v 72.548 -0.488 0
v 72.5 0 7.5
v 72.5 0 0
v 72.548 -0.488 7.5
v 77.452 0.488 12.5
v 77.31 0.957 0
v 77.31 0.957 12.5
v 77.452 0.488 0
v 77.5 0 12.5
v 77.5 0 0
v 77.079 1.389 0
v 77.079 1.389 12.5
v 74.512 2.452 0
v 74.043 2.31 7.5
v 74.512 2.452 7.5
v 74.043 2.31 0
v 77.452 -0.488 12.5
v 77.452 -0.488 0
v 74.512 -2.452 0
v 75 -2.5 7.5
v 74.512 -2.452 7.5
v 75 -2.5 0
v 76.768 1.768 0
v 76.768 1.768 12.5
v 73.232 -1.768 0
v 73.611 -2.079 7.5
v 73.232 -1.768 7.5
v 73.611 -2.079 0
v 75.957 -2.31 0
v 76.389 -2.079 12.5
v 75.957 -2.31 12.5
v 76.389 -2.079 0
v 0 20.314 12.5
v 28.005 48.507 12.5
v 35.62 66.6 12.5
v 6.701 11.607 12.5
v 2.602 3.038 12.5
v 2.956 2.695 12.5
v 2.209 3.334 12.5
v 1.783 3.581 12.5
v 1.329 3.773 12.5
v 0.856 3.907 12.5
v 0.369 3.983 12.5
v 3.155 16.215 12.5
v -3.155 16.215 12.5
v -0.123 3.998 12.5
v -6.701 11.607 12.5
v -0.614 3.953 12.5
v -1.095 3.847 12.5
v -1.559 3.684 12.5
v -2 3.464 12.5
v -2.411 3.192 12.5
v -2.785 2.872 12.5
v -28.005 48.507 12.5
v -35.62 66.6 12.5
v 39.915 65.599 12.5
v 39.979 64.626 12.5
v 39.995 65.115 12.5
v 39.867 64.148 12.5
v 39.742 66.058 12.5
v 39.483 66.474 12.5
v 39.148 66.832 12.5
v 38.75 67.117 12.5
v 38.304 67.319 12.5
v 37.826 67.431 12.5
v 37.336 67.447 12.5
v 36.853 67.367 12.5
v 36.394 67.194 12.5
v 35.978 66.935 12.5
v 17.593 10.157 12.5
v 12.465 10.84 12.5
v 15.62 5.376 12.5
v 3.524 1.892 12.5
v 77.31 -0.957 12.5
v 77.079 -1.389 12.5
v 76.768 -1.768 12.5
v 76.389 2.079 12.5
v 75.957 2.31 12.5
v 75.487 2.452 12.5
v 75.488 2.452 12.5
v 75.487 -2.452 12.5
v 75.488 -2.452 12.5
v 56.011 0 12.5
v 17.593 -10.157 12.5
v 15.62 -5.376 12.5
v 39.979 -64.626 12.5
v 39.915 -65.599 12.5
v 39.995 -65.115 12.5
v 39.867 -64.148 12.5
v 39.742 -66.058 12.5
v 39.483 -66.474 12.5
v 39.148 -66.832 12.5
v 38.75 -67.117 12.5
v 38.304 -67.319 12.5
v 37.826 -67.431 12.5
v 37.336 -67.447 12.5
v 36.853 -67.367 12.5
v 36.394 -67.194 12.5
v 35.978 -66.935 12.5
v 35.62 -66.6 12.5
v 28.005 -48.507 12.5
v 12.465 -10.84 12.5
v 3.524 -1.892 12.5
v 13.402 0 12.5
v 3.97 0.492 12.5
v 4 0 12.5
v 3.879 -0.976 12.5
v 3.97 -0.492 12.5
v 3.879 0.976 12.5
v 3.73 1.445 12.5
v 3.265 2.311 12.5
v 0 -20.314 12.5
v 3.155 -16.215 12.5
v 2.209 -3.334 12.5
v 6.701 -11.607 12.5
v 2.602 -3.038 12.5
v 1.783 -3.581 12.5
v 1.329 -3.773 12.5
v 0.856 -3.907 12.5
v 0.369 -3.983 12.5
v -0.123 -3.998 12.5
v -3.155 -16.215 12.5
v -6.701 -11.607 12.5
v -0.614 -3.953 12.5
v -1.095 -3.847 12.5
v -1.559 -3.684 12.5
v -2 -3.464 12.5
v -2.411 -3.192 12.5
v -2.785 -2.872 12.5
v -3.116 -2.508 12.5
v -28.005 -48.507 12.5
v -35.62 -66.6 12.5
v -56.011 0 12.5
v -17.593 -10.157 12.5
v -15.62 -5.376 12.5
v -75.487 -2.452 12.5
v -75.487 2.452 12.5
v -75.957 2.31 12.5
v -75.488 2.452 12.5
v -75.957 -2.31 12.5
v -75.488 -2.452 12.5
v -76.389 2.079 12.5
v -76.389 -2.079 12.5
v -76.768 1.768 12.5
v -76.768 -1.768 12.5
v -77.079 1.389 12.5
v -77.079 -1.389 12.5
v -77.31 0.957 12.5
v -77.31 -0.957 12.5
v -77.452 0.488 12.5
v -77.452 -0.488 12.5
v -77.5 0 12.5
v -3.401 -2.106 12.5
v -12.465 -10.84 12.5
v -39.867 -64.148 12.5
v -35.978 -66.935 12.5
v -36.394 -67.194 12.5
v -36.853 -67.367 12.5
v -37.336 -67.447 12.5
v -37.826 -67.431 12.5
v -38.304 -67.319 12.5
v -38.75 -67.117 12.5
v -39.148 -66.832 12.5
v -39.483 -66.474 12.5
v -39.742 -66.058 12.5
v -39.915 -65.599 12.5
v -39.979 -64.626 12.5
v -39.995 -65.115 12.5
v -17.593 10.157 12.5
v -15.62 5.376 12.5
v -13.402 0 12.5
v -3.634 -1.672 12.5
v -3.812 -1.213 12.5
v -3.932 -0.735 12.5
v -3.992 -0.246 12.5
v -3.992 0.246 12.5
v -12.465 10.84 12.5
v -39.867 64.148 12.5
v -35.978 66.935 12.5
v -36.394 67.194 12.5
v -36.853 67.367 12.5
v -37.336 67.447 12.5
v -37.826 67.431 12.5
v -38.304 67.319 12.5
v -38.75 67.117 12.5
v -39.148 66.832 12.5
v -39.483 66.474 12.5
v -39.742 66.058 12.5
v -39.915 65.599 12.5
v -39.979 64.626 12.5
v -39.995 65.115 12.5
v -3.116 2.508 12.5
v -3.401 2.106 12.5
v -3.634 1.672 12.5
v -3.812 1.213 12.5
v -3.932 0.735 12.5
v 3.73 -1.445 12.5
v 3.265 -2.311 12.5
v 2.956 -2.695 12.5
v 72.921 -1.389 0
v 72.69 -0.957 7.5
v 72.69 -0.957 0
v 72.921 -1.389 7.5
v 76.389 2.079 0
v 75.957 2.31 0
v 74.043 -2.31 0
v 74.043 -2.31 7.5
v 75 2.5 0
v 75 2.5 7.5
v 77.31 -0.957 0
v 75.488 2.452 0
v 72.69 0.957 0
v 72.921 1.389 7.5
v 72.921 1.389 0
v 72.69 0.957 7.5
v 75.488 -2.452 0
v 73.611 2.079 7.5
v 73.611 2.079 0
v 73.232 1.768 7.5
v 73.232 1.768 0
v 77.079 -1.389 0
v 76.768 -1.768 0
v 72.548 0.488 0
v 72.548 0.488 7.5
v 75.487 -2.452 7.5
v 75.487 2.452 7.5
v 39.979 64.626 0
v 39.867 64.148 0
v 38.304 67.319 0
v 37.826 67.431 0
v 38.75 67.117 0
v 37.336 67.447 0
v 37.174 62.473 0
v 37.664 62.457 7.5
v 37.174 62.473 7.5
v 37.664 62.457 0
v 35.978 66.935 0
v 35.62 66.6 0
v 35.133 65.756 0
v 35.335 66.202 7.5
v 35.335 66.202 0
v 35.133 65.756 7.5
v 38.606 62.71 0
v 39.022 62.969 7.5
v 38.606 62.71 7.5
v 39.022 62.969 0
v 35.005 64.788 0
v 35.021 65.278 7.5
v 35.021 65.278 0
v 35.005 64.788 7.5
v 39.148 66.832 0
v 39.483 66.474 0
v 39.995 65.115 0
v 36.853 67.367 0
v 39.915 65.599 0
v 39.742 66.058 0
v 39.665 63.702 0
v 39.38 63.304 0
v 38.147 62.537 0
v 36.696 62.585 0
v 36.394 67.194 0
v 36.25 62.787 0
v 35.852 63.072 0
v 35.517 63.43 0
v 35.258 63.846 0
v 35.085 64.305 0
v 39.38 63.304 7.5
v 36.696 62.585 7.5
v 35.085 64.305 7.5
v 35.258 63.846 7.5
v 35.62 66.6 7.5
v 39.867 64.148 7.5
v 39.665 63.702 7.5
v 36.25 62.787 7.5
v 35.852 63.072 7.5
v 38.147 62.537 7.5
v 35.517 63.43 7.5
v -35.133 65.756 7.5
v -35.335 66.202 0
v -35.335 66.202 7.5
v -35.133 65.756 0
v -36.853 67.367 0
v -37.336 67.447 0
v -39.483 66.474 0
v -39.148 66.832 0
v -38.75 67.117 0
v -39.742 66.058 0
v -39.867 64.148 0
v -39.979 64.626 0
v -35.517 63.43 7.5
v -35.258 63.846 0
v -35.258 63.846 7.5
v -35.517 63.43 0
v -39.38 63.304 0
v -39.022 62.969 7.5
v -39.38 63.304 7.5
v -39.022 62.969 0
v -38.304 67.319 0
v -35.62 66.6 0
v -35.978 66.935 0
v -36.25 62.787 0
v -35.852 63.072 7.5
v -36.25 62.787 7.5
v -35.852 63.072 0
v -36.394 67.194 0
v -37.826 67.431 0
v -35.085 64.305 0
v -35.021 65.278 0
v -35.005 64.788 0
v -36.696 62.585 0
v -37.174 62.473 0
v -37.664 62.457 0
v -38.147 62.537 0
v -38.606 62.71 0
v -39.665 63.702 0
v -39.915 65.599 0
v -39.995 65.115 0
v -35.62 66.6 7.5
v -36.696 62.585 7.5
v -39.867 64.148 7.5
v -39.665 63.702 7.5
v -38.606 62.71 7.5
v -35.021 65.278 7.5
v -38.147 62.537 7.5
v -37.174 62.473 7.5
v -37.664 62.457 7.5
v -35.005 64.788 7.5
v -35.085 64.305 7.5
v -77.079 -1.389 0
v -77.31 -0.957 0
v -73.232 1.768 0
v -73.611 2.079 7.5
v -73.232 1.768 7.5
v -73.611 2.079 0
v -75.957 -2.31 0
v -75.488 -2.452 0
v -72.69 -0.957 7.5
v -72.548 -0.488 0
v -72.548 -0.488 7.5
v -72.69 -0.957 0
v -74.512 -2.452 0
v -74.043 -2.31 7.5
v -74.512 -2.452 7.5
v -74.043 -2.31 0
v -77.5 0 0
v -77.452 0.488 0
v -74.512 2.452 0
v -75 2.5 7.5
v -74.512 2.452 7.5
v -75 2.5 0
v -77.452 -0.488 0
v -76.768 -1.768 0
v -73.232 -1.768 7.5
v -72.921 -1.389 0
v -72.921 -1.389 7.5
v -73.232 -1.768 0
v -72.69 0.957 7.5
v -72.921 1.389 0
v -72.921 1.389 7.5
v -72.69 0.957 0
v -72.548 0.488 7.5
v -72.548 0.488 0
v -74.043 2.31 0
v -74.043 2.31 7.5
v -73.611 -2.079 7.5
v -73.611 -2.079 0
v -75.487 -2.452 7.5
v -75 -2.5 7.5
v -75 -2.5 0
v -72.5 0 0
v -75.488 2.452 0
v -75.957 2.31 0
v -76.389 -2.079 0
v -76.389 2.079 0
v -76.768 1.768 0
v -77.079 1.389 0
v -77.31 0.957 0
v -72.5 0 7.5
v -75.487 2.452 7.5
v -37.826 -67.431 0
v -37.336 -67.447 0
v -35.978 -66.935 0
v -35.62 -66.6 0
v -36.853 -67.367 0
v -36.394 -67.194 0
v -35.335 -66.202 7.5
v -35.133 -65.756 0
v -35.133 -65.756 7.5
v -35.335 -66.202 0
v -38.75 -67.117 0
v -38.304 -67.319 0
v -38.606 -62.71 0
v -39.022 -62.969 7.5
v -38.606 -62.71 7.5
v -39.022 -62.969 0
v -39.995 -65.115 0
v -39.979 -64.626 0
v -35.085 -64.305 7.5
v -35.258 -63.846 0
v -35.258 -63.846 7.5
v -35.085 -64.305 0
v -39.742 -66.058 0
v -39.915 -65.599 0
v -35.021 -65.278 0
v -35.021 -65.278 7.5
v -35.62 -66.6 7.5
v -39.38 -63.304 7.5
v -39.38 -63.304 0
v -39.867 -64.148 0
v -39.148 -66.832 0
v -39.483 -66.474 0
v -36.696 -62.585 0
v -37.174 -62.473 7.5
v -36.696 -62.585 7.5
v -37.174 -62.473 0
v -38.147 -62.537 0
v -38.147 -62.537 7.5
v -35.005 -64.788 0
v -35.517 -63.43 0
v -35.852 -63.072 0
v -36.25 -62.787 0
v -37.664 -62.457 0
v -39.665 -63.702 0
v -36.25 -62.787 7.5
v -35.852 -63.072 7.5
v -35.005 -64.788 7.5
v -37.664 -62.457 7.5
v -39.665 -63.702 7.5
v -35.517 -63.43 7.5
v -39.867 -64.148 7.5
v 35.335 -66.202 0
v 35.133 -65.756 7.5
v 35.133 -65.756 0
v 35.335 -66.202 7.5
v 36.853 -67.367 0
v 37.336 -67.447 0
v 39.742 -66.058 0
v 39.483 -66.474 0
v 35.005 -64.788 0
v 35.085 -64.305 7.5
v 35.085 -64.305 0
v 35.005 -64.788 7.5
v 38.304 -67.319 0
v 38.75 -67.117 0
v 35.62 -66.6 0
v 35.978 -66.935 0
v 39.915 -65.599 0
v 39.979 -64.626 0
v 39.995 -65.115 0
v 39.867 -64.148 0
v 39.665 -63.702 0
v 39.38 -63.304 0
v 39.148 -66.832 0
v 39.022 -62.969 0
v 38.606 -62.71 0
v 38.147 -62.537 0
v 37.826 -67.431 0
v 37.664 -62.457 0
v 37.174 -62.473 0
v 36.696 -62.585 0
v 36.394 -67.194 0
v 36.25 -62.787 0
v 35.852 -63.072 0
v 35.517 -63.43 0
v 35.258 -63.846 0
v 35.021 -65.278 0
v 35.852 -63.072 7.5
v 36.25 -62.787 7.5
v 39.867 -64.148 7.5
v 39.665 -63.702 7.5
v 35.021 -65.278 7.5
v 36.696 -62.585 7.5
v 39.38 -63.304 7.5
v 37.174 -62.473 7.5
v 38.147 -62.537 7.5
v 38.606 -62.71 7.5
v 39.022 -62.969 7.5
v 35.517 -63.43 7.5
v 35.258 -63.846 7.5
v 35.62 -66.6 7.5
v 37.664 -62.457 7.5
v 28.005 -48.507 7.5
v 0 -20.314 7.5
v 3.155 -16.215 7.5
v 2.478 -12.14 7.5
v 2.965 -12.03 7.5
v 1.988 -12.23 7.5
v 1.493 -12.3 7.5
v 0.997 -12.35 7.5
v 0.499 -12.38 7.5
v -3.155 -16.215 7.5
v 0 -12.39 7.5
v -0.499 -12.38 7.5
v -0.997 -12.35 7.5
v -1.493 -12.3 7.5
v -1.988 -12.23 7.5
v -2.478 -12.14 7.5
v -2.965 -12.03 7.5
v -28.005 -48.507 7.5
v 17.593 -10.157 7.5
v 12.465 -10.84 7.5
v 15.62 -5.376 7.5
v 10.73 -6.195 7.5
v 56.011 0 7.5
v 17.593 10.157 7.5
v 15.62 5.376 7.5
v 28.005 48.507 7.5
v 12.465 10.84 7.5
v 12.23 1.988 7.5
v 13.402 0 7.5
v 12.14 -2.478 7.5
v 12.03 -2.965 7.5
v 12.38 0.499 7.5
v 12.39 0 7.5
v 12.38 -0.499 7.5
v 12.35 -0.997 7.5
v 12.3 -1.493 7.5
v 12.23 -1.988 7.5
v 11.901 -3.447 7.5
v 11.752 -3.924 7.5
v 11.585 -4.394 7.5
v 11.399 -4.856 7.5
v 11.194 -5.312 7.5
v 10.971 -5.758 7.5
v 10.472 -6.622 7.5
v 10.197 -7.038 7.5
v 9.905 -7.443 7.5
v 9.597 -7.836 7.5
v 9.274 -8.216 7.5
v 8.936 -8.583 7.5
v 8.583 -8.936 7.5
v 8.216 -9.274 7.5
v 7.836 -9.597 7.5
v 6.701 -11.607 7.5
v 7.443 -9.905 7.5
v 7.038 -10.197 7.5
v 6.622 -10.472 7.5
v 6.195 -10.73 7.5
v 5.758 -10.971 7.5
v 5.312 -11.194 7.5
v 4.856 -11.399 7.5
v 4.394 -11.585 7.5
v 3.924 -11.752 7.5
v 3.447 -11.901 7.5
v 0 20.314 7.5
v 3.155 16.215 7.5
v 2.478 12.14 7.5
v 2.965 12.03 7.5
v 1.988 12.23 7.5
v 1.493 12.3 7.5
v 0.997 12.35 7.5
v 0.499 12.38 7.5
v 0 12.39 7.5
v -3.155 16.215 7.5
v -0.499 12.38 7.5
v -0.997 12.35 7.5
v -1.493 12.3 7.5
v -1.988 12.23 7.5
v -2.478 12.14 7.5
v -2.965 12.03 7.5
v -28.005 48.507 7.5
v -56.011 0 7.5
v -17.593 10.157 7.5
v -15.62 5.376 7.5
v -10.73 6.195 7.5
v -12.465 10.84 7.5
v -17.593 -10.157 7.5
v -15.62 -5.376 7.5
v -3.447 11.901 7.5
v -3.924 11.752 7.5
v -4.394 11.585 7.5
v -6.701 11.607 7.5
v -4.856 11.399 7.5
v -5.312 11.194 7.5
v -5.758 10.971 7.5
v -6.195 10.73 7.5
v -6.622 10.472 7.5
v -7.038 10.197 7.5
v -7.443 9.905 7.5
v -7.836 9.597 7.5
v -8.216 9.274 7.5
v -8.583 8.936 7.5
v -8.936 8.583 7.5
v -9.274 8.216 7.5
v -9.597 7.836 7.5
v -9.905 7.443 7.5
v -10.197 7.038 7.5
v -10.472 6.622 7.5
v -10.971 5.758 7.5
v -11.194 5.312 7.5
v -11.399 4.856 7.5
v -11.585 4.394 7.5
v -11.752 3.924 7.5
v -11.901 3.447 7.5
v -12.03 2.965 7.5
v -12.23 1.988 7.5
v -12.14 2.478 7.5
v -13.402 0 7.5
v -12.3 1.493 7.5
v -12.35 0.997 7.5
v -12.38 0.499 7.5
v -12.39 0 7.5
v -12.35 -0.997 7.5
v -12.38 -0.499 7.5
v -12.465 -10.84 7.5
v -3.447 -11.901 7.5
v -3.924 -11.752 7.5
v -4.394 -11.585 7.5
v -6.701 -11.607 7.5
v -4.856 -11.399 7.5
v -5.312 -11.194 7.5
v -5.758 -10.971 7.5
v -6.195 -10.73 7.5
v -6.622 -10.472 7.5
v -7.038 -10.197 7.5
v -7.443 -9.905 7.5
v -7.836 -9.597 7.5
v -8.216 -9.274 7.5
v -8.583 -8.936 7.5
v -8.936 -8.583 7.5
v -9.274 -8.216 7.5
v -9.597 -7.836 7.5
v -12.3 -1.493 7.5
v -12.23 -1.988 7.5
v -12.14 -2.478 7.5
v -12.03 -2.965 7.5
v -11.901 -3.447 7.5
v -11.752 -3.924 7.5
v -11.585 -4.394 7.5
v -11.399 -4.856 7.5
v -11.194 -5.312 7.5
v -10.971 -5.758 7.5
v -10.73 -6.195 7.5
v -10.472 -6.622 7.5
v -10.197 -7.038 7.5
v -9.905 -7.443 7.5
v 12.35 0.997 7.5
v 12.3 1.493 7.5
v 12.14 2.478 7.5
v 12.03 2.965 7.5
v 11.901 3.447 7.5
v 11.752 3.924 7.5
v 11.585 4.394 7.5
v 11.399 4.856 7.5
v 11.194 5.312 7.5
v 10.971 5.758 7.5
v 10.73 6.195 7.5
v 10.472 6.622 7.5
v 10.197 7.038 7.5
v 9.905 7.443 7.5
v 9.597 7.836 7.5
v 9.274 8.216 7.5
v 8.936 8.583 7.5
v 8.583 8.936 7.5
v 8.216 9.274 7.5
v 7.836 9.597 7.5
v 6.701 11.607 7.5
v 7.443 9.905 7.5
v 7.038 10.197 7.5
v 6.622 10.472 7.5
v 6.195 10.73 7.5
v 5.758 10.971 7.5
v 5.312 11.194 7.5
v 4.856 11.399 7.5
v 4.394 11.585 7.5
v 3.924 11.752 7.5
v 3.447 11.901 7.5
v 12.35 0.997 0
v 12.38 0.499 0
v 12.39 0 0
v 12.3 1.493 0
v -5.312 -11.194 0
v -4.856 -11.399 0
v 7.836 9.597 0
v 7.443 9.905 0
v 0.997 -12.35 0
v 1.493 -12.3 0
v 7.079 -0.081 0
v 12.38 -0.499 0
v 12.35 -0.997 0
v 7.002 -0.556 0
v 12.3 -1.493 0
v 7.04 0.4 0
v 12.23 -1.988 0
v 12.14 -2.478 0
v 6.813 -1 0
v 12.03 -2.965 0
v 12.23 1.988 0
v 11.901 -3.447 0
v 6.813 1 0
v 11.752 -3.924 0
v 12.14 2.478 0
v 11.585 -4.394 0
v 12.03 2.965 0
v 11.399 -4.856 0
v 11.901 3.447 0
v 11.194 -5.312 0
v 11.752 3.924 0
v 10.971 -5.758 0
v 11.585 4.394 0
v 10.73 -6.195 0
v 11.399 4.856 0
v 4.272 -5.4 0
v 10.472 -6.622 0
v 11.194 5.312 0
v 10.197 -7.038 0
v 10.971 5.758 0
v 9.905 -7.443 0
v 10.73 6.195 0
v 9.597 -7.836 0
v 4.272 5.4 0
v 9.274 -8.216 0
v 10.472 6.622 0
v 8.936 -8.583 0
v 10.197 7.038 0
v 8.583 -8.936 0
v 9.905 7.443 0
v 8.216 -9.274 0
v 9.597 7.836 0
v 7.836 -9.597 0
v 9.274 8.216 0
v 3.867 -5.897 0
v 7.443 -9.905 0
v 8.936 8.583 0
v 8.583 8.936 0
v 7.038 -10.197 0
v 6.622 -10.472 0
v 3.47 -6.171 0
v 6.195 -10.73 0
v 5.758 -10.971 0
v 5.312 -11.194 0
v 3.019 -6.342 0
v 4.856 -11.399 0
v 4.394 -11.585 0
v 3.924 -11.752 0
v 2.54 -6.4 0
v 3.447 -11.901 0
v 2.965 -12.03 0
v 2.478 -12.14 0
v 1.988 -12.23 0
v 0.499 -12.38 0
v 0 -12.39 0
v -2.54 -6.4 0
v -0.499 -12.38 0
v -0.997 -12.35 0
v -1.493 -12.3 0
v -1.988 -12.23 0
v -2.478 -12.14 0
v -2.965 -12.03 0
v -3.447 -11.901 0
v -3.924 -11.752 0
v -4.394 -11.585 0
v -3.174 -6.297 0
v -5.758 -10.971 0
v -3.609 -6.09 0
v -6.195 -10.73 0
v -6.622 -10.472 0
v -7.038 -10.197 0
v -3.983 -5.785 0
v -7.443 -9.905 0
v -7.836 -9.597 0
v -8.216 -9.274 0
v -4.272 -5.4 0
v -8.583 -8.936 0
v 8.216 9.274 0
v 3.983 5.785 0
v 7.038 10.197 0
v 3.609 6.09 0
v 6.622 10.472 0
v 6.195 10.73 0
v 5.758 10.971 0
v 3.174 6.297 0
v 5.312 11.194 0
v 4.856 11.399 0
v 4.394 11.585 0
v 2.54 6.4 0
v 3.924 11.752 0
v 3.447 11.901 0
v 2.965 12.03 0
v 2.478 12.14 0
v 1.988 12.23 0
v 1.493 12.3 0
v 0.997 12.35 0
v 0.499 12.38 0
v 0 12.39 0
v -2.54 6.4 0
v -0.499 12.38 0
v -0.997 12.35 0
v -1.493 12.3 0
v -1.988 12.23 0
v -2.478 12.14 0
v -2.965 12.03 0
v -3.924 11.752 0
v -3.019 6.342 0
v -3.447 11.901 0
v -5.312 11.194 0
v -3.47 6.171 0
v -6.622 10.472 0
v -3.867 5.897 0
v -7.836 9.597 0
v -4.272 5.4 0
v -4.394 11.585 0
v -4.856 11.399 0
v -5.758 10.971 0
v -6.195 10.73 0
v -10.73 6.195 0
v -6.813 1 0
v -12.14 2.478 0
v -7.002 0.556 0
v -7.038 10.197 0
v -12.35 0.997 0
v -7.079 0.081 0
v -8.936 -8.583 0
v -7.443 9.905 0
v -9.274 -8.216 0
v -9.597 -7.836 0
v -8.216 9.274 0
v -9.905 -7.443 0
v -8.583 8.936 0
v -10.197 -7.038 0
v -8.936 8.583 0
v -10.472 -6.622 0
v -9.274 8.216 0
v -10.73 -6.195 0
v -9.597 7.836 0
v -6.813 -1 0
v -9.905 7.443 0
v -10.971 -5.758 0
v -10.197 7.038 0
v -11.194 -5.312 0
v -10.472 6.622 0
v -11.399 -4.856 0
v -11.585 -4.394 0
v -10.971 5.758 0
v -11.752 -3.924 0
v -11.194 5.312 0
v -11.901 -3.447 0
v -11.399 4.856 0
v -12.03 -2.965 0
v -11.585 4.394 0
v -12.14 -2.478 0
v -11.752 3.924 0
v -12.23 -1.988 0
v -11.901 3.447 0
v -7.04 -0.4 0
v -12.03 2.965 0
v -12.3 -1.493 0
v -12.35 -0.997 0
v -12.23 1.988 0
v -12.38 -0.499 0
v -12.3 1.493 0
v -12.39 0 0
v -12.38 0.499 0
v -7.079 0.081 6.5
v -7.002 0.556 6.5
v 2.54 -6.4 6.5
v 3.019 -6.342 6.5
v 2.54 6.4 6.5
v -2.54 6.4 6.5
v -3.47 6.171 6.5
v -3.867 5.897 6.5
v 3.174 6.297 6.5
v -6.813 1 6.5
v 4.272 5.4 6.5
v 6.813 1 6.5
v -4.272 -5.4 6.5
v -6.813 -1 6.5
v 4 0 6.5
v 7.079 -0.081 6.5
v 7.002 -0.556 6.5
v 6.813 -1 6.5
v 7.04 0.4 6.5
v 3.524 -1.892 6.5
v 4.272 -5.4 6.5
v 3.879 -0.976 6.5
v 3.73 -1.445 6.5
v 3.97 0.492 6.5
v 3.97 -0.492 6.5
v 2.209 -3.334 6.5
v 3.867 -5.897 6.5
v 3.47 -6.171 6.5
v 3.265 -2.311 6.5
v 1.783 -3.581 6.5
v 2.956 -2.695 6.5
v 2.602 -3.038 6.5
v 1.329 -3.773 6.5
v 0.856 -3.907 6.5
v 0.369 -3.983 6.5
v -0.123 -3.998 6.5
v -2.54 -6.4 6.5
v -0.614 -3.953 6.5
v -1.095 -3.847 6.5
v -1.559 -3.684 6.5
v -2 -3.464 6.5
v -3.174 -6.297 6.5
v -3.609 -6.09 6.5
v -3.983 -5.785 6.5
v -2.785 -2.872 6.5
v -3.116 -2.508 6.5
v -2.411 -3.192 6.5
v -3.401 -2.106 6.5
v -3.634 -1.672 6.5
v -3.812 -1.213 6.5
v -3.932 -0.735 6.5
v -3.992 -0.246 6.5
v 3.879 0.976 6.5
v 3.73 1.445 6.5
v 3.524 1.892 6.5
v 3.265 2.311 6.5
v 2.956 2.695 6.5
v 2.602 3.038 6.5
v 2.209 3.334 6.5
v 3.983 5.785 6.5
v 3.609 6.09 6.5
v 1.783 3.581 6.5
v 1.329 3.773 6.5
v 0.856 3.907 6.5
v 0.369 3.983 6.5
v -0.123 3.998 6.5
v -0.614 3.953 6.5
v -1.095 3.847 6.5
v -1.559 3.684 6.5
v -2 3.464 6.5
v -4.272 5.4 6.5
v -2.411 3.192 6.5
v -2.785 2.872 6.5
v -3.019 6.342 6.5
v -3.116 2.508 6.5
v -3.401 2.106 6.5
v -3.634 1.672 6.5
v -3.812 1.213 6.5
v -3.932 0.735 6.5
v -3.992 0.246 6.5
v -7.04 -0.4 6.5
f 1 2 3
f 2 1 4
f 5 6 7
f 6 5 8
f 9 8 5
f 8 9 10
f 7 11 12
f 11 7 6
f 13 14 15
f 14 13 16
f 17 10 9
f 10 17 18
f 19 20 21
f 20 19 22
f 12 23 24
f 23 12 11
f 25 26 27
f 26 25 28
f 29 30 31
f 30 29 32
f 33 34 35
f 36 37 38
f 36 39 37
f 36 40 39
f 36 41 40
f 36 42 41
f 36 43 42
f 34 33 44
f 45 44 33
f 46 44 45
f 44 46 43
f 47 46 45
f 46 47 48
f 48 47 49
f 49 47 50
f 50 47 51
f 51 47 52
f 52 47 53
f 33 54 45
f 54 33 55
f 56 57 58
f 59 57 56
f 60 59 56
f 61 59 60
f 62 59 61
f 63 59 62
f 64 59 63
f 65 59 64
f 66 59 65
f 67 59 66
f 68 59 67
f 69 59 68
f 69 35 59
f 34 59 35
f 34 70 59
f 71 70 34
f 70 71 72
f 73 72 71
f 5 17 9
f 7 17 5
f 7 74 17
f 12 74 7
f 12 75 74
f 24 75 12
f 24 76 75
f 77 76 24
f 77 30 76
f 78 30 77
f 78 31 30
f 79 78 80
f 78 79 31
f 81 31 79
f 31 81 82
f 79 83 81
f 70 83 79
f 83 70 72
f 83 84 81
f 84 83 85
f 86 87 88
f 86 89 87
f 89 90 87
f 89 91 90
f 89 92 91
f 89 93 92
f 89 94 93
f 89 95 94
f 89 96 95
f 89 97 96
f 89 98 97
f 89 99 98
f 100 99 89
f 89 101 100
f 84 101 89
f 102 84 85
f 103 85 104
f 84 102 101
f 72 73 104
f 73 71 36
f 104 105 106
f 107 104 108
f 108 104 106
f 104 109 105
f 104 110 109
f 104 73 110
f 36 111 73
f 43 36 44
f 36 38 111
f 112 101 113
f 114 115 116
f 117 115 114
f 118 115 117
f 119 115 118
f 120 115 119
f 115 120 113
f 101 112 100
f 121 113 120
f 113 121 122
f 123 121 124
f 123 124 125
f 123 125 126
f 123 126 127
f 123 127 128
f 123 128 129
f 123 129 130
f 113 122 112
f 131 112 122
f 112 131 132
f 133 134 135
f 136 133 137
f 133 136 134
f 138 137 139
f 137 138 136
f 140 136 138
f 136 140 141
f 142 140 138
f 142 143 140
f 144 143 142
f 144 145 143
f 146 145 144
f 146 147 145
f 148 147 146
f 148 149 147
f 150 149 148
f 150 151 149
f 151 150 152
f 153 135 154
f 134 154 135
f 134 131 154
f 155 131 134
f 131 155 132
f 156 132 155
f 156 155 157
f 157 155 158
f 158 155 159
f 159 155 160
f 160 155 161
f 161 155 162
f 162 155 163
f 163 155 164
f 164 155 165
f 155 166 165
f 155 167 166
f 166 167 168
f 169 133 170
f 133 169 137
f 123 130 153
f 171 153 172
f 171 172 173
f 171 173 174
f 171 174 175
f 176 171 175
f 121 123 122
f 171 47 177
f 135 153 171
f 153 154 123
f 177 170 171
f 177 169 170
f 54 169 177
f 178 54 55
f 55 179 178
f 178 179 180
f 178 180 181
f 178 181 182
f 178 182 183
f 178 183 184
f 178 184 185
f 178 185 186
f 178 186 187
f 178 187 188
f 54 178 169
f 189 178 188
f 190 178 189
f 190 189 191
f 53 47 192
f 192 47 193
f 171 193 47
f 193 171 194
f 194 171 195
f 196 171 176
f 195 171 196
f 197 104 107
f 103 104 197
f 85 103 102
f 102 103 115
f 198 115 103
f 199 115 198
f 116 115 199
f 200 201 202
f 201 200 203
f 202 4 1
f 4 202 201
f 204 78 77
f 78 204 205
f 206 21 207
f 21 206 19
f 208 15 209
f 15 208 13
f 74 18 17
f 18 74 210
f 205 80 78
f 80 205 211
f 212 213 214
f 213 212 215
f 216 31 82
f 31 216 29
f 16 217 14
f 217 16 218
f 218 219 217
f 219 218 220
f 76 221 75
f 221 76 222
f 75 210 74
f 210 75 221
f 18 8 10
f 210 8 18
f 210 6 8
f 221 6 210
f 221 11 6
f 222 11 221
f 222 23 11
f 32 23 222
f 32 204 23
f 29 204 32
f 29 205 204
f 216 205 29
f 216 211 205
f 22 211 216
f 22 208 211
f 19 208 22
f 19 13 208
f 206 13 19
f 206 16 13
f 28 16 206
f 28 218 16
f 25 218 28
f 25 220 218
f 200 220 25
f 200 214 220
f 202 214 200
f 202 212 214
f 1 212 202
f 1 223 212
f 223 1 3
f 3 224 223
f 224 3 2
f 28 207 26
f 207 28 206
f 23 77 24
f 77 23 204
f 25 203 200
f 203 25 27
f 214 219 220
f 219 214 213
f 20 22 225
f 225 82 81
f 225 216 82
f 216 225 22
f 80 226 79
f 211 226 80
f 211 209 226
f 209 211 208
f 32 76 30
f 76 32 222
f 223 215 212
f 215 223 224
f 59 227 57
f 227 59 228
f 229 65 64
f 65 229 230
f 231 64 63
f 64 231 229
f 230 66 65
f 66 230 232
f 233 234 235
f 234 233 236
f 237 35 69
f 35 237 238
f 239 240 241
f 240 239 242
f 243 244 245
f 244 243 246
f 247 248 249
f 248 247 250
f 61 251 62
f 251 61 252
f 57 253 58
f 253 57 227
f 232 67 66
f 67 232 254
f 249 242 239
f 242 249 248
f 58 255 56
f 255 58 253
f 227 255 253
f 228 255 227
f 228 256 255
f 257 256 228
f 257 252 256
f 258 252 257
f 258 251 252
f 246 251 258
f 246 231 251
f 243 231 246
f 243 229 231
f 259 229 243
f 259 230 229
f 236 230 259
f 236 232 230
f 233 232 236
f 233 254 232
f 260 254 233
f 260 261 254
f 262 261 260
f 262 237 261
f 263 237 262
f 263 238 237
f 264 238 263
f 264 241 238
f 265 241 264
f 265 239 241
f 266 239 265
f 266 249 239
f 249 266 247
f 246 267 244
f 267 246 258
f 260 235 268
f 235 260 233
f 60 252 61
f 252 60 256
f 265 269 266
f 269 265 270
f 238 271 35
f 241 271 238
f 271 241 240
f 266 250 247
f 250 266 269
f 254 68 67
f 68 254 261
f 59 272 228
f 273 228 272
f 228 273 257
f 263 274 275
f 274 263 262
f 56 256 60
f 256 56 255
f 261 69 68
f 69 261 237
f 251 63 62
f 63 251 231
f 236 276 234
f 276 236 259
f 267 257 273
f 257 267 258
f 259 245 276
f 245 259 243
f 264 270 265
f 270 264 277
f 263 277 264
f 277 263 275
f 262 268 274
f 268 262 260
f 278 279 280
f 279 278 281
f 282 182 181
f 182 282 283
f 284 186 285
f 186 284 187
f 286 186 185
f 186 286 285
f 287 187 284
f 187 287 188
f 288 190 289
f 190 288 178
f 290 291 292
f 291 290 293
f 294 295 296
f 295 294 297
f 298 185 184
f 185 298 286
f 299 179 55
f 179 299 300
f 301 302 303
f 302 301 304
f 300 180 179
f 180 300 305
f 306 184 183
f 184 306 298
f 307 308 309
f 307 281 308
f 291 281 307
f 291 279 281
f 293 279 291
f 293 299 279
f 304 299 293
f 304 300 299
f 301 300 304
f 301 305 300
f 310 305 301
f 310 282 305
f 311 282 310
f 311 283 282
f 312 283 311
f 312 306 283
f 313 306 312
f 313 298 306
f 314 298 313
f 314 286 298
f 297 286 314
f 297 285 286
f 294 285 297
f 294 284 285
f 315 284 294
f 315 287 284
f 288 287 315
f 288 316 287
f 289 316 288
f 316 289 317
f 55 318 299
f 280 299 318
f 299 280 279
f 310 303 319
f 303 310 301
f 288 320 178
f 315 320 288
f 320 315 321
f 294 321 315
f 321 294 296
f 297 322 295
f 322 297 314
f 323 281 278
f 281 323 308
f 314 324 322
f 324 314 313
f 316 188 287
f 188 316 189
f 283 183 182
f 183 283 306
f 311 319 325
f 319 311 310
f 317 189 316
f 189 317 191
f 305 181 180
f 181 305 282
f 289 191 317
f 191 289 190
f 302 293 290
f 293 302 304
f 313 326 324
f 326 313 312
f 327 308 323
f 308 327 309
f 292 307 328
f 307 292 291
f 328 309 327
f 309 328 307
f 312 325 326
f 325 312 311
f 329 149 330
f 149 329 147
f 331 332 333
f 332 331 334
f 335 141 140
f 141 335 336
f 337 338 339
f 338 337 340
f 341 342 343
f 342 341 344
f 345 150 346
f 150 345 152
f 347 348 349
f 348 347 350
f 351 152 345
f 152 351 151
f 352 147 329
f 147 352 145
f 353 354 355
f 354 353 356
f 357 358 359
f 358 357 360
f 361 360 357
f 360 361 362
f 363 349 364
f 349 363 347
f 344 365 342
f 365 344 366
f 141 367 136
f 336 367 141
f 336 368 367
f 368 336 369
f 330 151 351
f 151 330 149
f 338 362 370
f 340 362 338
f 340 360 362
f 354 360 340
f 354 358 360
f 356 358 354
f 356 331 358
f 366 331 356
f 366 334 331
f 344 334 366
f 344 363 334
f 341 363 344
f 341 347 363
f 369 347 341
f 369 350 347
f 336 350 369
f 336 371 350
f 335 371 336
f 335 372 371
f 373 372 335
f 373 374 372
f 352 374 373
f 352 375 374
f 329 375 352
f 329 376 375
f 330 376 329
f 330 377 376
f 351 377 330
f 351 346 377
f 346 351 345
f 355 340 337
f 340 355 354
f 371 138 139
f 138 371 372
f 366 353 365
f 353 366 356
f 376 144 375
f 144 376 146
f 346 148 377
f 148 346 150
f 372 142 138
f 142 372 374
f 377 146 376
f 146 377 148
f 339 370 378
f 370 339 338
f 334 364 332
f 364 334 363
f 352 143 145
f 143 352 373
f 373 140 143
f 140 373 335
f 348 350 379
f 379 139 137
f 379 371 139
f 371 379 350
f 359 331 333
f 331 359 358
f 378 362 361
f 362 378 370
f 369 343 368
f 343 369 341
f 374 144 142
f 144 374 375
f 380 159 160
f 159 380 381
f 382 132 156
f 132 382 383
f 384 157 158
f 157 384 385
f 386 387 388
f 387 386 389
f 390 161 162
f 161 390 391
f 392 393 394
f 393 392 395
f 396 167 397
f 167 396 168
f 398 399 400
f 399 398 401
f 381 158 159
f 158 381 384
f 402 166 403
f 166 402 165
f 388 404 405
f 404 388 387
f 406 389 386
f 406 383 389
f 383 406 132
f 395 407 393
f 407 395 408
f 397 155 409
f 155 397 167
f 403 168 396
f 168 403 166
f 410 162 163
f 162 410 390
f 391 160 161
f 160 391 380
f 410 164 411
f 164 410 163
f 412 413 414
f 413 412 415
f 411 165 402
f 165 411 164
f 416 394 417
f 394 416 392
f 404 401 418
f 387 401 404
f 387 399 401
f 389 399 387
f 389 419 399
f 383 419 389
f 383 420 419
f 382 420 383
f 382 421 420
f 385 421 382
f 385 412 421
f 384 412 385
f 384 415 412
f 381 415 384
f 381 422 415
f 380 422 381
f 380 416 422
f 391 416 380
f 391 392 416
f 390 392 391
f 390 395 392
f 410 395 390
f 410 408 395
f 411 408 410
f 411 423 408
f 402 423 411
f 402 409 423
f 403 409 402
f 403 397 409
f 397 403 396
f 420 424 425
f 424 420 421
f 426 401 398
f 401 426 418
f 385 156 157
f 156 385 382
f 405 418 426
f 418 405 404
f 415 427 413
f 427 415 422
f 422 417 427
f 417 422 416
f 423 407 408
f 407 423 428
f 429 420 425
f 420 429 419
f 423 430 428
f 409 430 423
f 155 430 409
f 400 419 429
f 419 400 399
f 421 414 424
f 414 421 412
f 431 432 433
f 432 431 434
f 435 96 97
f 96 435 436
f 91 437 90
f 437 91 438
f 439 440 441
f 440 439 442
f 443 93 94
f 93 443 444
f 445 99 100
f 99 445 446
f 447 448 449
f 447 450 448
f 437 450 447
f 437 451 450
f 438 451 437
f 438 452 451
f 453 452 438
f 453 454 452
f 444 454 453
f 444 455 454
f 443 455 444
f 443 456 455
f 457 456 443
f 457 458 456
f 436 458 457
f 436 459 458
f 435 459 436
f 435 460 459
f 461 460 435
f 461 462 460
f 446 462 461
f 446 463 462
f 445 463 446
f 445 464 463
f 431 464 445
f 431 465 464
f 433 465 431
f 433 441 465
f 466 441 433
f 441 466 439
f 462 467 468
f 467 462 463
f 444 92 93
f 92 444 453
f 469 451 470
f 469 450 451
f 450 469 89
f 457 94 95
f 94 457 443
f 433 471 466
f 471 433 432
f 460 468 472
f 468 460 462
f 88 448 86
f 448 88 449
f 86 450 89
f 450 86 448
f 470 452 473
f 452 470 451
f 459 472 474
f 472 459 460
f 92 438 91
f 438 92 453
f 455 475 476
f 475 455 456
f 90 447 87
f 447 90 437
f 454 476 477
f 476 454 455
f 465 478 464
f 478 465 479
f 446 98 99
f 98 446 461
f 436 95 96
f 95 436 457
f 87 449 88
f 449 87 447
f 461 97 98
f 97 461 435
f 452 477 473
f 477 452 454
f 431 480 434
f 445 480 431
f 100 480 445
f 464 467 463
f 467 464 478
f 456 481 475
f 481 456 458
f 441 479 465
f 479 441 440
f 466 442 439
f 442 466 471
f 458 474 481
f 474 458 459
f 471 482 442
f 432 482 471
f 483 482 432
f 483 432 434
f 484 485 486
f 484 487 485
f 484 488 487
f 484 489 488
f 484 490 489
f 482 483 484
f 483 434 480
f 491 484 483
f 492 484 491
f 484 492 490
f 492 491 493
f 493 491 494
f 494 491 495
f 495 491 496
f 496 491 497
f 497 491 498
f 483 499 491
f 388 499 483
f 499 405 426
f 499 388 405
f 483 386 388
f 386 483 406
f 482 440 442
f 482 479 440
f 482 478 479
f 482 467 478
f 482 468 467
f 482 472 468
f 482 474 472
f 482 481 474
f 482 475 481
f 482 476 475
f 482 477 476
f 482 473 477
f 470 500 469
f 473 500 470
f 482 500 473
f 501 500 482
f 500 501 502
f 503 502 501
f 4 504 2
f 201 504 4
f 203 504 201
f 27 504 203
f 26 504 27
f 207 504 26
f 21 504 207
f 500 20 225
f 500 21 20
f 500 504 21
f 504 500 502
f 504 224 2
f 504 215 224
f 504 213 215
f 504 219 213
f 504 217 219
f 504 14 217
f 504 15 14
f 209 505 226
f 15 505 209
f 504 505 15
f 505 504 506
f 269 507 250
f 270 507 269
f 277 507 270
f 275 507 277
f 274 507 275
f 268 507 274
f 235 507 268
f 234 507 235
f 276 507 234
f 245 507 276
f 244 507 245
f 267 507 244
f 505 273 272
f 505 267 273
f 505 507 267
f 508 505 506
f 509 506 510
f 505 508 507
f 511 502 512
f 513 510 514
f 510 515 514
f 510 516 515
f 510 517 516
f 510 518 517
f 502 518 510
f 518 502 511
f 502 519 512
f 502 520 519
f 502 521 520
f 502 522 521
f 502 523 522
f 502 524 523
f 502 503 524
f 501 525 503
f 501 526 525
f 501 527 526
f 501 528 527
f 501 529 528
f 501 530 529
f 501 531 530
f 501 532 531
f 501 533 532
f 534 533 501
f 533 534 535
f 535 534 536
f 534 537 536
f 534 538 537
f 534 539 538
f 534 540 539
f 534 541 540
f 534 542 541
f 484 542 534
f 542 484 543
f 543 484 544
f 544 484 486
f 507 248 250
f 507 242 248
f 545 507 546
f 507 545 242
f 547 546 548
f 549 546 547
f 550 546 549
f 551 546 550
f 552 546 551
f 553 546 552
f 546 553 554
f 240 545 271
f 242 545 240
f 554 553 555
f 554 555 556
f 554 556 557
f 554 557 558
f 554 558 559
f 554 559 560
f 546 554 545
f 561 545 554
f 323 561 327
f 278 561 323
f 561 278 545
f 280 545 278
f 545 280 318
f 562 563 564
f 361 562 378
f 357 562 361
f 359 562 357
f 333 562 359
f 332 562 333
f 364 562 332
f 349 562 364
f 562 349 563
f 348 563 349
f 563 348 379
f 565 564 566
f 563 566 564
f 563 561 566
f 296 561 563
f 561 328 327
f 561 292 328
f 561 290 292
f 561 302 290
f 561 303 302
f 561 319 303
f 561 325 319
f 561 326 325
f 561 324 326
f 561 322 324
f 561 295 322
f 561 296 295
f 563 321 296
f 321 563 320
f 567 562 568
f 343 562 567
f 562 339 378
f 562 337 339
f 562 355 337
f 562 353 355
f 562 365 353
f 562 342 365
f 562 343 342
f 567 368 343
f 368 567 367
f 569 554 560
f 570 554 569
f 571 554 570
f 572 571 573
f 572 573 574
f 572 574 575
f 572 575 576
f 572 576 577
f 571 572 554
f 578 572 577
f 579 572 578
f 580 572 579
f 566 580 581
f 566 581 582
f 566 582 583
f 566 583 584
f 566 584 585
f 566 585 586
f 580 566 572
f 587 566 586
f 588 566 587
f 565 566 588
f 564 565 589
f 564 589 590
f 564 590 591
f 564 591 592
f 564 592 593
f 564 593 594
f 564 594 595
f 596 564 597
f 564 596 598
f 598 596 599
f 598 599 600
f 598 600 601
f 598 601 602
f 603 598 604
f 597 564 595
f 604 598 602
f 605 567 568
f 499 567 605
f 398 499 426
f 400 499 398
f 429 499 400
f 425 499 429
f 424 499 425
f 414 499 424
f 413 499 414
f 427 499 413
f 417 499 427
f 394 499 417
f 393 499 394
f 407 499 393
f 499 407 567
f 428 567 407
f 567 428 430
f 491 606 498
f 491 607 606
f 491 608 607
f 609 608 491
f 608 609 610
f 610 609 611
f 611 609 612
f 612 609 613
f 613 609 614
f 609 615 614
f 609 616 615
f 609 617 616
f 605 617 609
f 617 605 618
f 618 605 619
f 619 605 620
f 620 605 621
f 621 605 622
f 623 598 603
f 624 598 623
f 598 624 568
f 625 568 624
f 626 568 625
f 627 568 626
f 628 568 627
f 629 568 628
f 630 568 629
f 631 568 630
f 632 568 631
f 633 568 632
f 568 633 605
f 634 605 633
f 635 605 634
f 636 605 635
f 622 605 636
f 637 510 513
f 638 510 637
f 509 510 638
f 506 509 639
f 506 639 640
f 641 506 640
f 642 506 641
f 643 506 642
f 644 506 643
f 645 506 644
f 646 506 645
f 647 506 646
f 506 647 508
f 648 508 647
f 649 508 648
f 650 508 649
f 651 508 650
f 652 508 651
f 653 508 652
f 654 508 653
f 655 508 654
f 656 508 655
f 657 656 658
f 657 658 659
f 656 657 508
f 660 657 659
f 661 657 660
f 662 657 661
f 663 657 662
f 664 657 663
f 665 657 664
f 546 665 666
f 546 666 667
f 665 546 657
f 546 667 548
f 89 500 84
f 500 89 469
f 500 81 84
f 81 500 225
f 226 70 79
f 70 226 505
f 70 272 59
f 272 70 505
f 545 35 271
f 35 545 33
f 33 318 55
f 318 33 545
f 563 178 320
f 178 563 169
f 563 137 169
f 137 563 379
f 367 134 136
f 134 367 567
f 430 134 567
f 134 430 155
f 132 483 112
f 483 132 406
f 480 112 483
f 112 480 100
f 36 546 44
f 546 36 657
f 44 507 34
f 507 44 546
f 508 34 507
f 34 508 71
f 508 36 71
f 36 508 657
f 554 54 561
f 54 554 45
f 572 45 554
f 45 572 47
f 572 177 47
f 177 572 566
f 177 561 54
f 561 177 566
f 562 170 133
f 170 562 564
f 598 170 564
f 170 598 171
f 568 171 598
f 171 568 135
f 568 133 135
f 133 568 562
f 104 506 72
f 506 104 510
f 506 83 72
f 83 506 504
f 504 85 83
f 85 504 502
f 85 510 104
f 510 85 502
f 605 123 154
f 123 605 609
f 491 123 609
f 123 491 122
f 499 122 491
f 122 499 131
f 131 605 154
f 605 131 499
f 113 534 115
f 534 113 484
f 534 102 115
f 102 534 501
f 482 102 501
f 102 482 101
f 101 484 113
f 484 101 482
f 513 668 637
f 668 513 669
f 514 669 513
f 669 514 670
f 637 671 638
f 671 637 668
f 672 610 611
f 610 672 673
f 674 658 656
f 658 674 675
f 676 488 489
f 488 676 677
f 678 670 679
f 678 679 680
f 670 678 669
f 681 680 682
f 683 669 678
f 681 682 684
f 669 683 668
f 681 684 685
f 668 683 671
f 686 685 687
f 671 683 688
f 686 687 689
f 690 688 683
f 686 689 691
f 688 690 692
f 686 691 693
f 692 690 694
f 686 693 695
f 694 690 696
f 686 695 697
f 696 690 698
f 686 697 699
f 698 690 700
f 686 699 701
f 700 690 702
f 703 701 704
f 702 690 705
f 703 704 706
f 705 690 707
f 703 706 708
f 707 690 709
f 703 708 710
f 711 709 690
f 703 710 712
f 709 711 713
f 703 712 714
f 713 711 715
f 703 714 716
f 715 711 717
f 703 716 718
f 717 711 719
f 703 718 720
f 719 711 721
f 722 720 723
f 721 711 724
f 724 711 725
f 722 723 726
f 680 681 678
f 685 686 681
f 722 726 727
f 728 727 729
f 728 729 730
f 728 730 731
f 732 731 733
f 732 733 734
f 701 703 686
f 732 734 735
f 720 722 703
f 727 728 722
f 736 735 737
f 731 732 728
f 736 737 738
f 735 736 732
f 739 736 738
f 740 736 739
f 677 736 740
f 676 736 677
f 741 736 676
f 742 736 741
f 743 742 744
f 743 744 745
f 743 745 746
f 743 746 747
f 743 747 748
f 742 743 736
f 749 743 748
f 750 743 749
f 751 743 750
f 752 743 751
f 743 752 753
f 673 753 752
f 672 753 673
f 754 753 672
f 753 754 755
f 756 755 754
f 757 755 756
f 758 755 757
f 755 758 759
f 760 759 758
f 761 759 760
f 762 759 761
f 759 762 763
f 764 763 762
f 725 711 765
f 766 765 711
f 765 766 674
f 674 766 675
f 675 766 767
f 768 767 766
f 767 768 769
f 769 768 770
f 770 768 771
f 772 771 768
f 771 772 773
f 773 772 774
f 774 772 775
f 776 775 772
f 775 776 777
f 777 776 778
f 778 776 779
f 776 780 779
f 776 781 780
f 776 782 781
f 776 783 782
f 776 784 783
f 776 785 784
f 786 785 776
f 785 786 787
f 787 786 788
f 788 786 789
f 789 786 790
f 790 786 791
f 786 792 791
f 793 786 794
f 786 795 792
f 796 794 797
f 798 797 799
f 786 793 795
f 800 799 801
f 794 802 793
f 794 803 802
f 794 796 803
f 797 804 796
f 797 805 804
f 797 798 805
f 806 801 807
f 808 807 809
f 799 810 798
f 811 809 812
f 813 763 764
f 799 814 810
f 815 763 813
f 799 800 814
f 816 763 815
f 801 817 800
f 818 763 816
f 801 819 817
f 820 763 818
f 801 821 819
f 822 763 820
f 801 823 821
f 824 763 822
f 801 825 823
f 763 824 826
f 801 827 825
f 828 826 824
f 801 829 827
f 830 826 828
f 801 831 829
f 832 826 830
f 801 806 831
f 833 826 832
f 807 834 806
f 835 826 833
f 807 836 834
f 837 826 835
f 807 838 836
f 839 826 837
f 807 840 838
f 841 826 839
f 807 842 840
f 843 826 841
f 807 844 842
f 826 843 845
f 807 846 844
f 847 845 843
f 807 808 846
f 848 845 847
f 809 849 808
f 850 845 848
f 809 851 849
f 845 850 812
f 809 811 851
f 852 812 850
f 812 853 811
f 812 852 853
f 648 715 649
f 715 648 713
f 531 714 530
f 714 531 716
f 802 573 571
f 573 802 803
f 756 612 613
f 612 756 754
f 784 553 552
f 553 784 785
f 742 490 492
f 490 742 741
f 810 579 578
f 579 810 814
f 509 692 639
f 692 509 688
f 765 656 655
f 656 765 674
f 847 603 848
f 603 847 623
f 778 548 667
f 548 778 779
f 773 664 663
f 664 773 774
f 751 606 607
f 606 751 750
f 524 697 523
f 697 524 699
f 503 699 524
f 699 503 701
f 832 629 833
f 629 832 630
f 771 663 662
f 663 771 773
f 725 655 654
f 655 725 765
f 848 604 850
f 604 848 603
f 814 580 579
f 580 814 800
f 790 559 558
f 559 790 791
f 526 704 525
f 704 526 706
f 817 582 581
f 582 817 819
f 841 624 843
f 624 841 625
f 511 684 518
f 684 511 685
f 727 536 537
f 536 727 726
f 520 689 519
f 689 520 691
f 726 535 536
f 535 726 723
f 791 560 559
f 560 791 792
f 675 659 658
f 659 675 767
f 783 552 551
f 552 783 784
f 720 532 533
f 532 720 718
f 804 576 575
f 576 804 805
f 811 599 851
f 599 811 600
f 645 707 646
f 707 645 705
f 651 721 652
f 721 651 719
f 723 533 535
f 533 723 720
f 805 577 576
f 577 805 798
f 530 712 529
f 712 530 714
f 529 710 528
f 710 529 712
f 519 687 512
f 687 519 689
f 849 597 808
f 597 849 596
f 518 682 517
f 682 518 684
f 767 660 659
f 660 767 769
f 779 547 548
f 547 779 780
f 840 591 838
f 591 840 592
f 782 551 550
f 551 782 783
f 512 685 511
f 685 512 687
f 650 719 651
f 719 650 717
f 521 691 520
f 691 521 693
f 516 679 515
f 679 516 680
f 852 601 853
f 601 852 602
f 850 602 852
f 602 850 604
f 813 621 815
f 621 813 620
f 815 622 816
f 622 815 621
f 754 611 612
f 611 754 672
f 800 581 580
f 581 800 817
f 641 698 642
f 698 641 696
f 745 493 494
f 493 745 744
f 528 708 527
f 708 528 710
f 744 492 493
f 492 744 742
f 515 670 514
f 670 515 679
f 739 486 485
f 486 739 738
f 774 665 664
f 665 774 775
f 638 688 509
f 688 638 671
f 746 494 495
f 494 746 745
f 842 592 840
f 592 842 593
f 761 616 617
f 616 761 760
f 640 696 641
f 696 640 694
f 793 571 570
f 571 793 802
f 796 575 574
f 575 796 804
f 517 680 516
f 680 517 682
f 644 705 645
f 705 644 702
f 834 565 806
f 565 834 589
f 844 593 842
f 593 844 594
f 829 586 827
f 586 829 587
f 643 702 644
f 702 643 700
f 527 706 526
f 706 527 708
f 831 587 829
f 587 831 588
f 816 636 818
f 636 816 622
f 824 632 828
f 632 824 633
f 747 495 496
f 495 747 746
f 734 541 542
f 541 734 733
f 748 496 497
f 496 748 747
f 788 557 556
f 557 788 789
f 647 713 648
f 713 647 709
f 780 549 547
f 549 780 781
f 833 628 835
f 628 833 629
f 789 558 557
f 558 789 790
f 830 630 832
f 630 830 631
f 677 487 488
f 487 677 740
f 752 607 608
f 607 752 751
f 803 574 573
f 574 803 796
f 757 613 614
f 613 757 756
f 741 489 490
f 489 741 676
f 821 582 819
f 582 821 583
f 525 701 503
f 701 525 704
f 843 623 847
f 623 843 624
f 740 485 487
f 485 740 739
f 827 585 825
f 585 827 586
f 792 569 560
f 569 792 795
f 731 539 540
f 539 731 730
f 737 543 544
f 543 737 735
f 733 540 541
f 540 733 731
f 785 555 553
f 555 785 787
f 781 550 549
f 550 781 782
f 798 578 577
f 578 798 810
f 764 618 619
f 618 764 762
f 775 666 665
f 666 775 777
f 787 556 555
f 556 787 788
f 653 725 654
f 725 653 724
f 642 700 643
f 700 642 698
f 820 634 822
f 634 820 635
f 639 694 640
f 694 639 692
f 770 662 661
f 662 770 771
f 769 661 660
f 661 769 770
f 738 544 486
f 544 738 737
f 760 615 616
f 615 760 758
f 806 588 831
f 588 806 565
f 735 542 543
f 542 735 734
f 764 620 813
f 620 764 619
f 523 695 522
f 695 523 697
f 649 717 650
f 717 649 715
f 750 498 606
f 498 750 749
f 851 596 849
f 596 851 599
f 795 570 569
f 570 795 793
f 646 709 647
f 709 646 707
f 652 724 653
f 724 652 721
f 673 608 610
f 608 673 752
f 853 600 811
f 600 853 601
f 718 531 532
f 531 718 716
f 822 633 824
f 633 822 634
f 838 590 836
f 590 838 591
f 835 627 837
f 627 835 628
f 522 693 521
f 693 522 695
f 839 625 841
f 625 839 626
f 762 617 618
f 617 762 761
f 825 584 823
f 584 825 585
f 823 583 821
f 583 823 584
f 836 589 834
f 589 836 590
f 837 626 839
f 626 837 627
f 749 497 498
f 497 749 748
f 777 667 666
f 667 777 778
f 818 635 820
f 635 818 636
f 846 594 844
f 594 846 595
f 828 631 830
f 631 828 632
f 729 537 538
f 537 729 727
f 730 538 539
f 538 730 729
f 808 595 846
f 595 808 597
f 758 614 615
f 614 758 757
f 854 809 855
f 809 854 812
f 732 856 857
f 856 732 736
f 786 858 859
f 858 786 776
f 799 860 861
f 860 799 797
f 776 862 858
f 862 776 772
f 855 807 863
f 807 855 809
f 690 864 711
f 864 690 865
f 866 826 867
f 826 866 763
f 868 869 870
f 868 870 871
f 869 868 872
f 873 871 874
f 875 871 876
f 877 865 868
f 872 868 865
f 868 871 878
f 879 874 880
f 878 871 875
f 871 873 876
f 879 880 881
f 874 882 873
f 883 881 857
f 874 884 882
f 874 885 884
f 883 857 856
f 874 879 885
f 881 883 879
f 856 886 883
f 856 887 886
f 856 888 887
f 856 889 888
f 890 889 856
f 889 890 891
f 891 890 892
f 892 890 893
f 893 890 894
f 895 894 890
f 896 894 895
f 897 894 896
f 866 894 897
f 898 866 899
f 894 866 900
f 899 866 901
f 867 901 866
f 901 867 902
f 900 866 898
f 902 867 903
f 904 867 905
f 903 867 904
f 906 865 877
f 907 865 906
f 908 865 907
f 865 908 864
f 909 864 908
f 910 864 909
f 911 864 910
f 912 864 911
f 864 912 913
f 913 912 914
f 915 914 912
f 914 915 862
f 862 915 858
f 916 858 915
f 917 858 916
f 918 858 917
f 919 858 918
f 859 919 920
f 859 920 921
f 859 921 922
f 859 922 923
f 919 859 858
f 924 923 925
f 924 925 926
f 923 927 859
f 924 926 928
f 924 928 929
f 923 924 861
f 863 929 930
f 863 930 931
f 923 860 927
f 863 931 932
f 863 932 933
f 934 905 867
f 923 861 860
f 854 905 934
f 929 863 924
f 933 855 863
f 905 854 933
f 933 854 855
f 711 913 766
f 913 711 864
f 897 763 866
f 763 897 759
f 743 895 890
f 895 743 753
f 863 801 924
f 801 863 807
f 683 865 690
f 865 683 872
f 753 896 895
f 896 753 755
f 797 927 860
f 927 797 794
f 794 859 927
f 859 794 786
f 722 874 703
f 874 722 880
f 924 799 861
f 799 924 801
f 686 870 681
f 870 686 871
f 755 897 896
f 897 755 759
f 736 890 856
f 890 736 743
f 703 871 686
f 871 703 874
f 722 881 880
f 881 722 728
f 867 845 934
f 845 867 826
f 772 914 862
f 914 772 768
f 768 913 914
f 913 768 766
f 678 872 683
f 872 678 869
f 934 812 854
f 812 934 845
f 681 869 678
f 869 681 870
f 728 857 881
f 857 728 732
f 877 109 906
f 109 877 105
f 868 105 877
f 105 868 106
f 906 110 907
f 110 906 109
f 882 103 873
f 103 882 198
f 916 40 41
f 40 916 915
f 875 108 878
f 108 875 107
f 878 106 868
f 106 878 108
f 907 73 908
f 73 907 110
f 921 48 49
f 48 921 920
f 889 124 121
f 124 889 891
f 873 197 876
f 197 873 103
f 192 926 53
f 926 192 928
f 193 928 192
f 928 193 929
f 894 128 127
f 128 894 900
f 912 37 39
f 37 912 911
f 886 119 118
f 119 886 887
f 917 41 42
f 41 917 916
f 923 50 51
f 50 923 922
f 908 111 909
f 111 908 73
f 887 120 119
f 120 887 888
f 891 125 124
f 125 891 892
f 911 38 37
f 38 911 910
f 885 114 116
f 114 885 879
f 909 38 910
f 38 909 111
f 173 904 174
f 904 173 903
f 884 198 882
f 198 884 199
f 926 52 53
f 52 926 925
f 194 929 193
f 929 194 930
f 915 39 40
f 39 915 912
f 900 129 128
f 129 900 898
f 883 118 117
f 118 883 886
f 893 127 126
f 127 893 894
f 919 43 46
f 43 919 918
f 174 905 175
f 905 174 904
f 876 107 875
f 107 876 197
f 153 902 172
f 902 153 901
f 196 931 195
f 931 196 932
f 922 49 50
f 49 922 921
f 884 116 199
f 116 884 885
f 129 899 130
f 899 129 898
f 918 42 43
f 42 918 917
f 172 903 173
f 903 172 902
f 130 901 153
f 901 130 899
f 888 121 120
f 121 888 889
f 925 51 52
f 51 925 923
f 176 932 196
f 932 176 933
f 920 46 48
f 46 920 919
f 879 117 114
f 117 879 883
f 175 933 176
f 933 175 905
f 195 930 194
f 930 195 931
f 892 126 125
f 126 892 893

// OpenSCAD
$fa = 0.5;
$fs = 0.5;

d_legs = 150;
d_bolt = 8;
d_nut = 12.8 * 2/sqrt(3);
h_nut = 6.5;
h = 30;
t = 5;
rounding = 2;

h_leg = h_nut + 1;
w_leg = t;
n_leg = 6;


module leg_shape() {
    difference() {
        hull() {
            circle(d = d_nut + t*2);
            translate([d_legs/2,0])
            circle(d = t);
        }
    }
}


module legs_shape() {
    for (i = [0:n_leg-1]) {
        rotate([0,0,i*360/n_leg])
        difference() {
            leg_shape();
            offset(-t)
            difference() {
                leg_shape();
                circle(d = d_nut);
            }
        }
    }
}



difference() {
    union() {
        translate([0,0,h_leg])
        linear_extrude(t)
        legs_shape();

        for (i = [0:n_leg-1]) {
            rotate([0,0,i*360/n_leg])
            translate([d_legs/2,0,0])
            cylinder(d = t, h = h_leg+t);
        }
        
        cylinder(d = d_nut + t*2, h = h_leg+t);
    }
    
    translate([0,0,-1])
    linear_extrude(h_nut+1)
    offset(rounding)
    offset(-rounding)
    circle(d = d_nut, $fn = 6);
    
    translate([0,0,-1])
    cylinder(d = d_bolt, h = h_leg+t+2);
}
